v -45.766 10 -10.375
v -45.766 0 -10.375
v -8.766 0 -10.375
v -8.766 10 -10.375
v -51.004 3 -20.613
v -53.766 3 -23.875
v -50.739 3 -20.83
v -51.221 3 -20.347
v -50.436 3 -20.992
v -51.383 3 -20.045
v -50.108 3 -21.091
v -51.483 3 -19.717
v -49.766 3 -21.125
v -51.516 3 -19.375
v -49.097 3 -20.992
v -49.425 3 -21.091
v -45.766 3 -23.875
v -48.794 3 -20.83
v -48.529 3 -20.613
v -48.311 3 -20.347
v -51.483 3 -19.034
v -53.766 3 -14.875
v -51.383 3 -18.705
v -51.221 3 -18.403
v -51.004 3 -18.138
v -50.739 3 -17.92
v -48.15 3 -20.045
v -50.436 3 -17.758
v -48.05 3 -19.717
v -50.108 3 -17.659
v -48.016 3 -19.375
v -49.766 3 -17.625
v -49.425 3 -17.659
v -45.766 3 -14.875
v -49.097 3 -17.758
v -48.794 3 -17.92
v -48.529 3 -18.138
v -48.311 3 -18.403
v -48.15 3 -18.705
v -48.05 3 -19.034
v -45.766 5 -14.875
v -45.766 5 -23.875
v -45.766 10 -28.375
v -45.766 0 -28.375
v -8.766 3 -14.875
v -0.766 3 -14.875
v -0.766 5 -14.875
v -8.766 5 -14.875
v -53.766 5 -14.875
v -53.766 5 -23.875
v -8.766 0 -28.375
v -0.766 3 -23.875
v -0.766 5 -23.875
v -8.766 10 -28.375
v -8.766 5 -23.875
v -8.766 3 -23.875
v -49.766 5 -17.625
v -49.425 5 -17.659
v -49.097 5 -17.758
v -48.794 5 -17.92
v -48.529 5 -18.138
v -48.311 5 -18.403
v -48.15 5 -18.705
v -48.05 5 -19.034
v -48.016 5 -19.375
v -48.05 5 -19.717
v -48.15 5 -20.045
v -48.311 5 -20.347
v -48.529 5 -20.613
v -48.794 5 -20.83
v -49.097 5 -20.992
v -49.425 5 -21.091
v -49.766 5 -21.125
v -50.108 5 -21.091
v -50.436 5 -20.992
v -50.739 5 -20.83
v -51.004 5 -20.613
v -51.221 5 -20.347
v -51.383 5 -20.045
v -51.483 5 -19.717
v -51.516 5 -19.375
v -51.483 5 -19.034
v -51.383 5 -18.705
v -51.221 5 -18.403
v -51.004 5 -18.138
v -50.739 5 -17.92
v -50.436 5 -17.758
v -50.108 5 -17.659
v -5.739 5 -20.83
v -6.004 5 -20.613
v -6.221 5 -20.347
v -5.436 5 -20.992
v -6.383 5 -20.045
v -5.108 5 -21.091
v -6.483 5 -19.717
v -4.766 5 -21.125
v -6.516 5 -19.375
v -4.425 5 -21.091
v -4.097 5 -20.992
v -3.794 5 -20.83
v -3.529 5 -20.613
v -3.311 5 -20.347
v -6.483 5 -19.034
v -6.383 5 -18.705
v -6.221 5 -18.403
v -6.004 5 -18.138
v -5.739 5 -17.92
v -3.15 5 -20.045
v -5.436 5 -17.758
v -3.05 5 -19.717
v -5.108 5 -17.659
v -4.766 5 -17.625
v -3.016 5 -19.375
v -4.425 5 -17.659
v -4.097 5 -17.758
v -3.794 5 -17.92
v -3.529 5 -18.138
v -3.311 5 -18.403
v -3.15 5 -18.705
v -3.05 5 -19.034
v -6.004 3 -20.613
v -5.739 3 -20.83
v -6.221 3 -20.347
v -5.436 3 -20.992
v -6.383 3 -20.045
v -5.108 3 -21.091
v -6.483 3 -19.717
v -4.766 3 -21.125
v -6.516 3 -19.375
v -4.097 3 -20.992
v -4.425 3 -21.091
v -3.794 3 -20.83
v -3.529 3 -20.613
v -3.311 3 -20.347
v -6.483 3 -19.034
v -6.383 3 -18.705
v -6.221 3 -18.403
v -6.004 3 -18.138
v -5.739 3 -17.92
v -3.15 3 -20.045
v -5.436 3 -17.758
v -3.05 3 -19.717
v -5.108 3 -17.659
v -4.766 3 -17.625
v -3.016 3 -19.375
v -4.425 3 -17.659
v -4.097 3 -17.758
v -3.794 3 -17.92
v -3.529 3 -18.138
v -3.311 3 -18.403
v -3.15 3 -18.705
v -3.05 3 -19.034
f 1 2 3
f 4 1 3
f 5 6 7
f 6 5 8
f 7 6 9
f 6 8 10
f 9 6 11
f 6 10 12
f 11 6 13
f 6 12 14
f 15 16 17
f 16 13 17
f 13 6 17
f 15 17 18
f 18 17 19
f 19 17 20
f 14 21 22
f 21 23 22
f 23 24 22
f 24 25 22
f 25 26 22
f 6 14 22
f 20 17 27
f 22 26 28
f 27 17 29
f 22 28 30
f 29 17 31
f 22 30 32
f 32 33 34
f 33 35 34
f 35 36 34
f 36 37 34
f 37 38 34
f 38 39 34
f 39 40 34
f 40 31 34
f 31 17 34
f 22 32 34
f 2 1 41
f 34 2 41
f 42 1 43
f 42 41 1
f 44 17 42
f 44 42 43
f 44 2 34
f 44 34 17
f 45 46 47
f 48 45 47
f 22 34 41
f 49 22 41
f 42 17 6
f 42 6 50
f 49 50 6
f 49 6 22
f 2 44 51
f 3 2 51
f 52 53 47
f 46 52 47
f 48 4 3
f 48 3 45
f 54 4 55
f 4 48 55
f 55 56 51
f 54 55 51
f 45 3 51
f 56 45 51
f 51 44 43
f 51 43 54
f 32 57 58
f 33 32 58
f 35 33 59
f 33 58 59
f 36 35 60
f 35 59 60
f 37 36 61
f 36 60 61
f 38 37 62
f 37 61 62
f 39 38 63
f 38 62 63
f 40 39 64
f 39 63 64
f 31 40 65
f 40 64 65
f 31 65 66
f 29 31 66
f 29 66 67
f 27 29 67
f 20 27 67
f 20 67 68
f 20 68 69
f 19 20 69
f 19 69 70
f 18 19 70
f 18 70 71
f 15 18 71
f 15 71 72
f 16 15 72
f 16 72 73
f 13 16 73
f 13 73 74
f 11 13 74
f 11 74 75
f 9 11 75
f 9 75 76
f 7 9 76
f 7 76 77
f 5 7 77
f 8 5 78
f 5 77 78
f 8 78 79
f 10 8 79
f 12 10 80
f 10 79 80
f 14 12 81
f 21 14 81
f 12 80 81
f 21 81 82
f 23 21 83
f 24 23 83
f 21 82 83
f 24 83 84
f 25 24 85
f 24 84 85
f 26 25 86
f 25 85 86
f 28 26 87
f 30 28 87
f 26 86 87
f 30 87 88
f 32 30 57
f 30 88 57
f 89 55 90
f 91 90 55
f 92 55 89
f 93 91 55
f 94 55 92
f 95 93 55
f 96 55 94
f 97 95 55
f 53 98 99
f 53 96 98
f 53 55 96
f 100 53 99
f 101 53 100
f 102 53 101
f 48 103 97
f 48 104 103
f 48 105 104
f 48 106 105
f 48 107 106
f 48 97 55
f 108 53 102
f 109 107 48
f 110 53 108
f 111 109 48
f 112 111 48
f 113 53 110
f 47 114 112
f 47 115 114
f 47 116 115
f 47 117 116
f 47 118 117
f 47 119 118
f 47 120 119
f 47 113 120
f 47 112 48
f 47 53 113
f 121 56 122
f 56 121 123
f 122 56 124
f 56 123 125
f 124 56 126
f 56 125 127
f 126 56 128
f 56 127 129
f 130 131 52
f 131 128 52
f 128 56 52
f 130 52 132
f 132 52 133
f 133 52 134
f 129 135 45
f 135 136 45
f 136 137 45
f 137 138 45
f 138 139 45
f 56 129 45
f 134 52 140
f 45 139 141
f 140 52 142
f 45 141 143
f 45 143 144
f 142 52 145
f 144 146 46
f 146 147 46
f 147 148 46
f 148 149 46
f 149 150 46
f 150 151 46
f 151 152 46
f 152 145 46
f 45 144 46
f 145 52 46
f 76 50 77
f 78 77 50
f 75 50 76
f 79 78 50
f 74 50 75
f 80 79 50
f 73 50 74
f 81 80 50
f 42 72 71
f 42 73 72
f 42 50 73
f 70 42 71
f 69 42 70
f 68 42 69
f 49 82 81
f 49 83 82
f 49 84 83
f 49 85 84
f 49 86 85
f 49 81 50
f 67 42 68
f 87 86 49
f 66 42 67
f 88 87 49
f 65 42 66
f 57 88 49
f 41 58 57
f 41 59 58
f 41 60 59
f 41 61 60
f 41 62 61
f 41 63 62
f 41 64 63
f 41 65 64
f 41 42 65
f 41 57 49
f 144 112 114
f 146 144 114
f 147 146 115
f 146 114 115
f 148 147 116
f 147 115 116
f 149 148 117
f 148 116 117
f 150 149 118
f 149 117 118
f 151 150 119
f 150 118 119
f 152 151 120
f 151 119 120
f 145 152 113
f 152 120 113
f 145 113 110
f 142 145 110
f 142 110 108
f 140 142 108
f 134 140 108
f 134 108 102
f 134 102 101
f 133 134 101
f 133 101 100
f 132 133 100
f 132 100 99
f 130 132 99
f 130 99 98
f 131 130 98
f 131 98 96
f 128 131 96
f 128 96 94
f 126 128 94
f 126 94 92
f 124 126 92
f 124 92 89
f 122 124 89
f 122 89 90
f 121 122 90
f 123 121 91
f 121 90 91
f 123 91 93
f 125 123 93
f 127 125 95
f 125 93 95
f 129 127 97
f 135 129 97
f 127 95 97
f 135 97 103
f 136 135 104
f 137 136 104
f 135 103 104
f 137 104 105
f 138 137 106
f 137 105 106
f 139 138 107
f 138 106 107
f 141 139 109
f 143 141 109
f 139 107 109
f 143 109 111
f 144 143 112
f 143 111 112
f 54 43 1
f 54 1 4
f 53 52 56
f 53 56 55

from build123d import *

# Parameters (mm, degrees)
SKETCH_1_W           = 37
SKETCH_1_H           = 18
EXTRUDE_1_DEPTH      = 10
EXTRUDE_2_DEPTH      = 8
EXTRUDE_2_DEPTH_BACK = 45
SKETCH_2_W           = 9
SKETCH_2_H           = 2
SKETCH_3_R           = 1.75
CUT_EXTRUDE_1_DEPTH  = 8


with BuildPart() as part:
    # 草图1 → 凸台-拉伸1 (new body)
    with BuildSketch(Plane(origin=(0, 0, 0), x_dir=(1, 0, 0), z_dir=(0, 1, 0))):
        with Locations((-27.266289308, 19.375099371)):
            Rectangle(SKETCH_1_W, SKETCH_1_H)
    extrude(amount=EXTRUDE_1_DEPTH)

    # 草图2 → 凸台-拉伸2 (add, two sides: drawn at the far end of the back side and taken through both)
    with BuildSketch(Plane.ZY.offset(45.766289308).offset(-EXTRUDE_2_DEPTH_BACK)):
        with Locations((-19.375099371, 4)):
            Rectangle(SKETCH_2_W, SKETCH_2_H)
    extrude(amount=EXTRUDE_2_DEPTH + EXTRUDE_2_DEPTH_BACK)

    # 草图3 → 切除-拉伸1 (cut)
    with BuildSketch(Plane(origin=(0, 5, 0), x_dir=(1, 0, 0), z_dir=(0, 1, 0))):
        with Locations(Location((-49.766289308, 19.375099371, 0), (0, 0, 270))):
            Circle(SKETCH_3_R)
        with Locations(Location((-4.766289308, 19.375099371, 0), (0, 0, 270))):
            Circle(SKETCH_3_R)
    extrude(amount=-CUT_EXTRUDE_1_DEPTH, mode=Mode.SUBTRACT)


solid = part.part
